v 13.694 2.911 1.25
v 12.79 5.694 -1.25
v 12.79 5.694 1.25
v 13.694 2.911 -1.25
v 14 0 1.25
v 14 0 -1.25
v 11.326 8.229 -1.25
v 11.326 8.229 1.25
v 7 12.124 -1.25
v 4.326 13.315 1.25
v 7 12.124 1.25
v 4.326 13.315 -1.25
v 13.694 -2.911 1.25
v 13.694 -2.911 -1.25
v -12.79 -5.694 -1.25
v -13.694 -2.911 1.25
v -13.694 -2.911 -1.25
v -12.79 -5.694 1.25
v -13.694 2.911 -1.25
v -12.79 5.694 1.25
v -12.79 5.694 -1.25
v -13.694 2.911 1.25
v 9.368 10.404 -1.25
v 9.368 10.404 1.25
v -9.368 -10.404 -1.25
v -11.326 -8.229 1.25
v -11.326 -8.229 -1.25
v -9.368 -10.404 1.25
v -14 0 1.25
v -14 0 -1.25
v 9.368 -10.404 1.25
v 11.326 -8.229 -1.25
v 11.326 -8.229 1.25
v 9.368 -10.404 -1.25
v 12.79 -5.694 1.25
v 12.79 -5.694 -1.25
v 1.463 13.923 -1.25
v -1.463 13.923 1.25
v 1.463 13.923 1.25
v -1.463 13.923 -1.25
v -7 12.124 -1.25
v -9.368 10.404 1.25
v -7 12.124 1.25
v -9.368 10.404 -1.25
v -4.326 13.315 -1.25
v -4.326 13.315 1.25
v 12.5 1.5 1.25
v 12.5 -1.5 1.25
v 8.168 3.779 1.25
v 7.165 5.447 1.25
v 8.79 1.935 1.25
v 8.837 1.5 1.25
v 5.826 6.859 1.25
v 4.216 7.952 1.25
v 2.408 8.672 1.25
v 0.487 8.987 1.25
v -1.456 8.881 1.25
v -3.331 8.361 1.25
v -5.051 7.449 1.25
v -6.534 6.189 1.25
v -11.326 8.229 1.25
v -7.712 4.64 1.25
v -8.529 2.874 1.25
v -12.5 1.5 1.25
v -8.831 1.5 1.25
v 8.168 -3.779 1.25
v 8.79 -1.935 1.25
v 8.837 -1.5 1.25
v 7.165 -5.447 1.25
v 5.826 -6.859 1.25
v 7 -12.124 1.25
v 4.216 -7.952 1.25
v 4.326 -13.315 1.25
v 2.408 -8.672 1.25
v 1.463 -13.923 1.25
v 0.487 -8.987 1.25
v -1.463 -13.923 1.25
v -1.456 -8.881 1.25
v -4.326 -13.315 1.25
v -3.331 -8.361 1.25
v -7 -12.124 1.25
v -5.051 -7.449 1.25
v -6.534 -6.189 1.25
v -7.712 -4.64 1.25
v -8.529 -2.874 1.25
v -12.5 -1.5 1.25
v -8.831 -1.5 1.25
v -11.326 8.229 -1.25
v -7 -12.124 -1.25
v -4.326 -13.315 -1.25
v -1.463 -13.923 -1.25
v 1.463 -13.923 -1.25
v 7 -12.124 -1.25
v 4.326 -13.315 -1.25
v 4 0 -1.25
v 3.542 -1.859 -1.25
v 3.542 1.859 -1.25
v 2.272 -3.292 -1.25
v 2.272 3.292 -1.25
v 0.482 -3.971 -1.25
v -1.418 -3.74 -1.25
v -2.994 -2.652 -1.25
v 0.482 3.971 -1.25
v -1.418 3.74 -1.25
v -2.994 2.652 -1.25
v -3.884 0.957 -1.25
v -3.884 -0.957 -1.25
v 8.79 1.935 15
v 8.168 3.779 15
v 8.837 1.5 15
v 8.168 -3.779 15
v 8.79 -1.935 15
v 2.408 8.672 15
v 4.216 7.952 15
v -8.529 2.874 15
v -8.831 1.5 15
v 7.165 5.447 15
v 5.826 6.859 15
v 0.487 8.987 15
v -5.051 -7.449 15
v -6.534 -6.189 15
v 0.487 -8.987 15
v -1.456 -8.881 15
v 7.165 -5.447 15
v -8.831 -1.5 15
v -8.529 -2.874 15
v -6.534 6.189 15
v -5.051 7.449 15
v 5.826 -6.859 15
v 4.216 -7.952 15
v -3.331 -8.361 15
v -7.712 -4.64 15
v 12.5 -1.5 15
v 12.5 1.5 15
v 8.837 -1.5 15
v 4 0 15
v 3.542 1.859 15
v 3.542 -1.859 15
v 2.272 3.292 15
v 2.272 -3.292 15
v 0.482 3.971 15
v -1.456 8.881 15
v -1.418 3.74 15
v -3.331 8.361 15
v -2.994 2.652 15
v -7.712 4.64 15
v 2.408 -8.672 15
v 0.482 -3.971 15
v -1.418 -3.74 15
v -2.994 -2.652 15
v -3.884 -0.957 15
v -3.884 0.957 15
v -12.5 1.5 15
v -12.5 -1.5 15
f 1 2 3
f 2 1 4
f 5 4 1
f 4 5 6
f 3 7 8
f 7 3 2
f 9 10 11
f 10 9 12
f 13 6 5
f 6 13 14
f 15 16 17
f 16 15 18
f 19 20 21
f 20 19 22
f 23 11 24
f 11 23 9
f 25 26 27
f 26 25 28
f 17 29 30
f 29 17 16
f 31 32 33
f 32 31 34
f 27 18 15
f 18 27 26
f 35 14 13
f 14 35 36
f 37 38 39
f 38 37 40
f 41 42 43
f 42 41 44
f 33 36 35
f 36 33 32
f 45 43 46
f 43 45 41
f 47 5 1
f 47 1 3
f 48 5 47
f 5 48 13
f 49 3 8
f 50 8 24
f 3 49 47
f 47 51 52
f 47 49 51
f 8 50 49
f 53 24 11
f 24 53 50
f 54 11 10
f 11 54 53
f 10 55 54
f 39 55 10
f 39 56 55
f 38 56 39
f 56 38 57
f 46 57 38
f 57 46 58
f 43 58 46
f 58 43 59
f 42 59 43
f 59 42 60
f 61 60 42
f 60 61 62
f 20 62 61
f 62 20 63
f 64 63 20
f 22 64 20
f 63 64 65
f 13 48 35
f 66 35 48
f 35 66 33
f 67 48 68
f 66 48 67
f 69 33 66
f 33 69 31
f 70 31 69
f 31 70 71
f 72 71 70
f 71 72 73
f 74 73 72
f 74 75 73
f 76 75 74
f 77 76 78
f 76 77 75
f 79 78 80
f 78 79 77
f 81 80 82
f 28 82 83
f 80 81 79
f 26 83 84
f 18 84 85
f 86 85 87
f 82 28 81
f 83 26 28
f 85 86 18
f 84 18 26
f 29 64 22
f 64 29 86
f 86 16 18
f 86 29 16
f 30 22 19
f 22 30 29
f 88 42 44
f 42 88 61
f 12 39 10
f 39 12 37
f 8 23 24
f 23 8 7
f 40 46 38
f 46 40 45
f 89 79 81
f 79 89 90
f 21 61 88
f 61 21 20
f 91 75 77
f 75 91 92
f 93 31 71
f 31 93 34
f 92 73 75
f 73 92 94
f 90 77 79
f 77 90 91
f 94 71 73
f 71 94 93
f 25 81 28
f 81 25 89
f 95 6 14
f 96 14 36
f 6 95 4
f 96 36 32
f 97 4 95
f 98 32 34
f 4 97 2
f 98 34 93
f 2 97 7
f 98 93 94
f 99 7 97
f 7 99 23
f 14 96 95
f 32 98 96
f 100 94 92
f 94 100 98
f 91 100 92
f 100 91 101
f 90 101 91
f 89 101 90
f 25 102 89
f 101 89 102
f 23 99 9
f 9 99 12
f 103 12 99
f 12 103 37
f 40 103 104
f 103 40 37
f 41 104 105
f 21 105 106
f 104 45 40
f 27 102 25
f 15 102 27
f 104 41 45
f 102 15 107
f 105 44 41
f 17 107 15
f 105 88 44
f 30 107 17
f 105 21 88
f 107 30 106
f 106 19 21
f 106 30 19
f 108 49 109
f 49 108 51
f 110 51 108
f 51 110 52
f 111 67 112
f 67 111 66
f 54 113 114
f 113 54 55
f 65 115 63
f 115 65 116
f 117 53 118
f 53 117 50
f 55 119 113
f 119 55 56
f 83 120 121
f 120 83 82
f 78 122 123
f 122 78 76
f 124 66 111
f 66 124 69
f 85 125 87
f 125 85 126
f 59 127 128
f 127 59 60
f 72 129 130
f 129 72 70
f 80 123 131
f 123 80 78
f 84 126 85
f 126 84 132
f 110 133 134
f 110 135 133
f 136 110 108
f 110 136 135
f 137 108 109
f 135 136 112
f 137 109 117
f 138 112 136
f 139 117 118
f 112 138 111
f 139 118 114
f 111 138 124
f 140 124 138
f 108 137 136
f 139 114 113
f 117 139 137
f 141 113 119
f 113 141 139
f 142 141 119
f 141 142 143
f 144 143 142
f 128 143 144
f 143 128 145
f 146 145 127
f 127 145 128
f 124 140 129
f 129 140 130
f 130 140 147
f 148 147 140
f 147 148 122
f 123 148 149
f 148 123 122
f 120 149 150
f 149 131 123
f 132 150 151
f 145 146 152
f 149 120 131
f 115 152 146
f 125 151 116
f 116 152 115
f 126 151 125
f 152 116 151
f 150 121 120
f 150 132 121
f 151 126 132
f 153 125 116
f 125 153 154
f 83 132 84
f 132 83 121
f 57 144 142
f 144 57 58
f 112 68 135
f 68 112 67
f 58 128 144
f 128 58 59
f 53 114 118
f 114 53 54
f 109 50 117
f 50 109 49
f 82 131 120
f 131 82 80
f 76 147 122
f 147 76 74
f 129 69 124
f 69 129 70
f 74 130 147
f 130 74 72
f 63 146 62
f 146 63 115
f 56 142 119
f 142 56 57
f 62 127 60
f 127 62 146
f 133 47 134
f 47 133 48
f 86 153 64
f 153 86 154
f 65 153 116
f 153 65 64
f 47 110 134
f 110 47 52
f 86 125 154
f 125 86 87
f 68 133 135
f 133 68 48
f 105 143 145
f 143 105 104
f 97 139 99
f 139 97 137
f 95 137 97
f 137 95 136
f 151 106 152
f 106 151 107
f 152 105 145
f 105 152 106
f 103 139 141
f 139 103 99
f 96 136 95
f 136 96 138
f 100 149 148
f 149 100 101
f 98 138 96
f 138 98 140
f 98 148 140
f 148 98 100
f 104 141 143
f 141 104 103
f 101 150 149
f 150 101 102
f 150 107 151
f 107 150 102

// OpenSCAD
/*
 *   Creates a nut for holding a toilet lid to a toilet bowl.
 *   Copyright (C) 2014  Mogue Carpenter
 *
 *    This program is free software: you can redistribute it and/or modify
 *    it under the terms of the GNU General Public License as published by
 *    the Free Software Foundation, either version 3 of the License, or
 *    (at your option) any later version.
 *
 *    This program is distributed in the hope that it will be useful,
 *    but WITHOUT ANY WARRANTY; without even the implied warranty of
 *    MERCHANTABILITY or FITNESS FOR A PARTICULAR PURPOSE.  See the
 *    GNU General Public License for more details.

 *    You should have received a copy of the GNU General Public License
 *    along with this program.  If not, see <http://www.gnu.org/licenses/>.
*/

outer_r = 14;
outer_h = 2.5;

inner_r = 9;
inner_h = 15 ;

bolt_hole_r = 4;

grip_w = 3;

difference(){
	bolt_body();
	translate([0,0,inner_h/2])
		cylinder( h=inner_h+3, r=bolt_hole_r , center=true);
}
module bolt_body(){
	cylinder( h=outer_h, r=outer_r , center=true);
	translate([0,0,inner_h/2])
		cylinder( h=inner_h, r=inner_r , center=true);
	translate([0,0,inner_h/2])
		cube([(outer_r*2)-3,grip_w,inner_h],center=true); 
}
